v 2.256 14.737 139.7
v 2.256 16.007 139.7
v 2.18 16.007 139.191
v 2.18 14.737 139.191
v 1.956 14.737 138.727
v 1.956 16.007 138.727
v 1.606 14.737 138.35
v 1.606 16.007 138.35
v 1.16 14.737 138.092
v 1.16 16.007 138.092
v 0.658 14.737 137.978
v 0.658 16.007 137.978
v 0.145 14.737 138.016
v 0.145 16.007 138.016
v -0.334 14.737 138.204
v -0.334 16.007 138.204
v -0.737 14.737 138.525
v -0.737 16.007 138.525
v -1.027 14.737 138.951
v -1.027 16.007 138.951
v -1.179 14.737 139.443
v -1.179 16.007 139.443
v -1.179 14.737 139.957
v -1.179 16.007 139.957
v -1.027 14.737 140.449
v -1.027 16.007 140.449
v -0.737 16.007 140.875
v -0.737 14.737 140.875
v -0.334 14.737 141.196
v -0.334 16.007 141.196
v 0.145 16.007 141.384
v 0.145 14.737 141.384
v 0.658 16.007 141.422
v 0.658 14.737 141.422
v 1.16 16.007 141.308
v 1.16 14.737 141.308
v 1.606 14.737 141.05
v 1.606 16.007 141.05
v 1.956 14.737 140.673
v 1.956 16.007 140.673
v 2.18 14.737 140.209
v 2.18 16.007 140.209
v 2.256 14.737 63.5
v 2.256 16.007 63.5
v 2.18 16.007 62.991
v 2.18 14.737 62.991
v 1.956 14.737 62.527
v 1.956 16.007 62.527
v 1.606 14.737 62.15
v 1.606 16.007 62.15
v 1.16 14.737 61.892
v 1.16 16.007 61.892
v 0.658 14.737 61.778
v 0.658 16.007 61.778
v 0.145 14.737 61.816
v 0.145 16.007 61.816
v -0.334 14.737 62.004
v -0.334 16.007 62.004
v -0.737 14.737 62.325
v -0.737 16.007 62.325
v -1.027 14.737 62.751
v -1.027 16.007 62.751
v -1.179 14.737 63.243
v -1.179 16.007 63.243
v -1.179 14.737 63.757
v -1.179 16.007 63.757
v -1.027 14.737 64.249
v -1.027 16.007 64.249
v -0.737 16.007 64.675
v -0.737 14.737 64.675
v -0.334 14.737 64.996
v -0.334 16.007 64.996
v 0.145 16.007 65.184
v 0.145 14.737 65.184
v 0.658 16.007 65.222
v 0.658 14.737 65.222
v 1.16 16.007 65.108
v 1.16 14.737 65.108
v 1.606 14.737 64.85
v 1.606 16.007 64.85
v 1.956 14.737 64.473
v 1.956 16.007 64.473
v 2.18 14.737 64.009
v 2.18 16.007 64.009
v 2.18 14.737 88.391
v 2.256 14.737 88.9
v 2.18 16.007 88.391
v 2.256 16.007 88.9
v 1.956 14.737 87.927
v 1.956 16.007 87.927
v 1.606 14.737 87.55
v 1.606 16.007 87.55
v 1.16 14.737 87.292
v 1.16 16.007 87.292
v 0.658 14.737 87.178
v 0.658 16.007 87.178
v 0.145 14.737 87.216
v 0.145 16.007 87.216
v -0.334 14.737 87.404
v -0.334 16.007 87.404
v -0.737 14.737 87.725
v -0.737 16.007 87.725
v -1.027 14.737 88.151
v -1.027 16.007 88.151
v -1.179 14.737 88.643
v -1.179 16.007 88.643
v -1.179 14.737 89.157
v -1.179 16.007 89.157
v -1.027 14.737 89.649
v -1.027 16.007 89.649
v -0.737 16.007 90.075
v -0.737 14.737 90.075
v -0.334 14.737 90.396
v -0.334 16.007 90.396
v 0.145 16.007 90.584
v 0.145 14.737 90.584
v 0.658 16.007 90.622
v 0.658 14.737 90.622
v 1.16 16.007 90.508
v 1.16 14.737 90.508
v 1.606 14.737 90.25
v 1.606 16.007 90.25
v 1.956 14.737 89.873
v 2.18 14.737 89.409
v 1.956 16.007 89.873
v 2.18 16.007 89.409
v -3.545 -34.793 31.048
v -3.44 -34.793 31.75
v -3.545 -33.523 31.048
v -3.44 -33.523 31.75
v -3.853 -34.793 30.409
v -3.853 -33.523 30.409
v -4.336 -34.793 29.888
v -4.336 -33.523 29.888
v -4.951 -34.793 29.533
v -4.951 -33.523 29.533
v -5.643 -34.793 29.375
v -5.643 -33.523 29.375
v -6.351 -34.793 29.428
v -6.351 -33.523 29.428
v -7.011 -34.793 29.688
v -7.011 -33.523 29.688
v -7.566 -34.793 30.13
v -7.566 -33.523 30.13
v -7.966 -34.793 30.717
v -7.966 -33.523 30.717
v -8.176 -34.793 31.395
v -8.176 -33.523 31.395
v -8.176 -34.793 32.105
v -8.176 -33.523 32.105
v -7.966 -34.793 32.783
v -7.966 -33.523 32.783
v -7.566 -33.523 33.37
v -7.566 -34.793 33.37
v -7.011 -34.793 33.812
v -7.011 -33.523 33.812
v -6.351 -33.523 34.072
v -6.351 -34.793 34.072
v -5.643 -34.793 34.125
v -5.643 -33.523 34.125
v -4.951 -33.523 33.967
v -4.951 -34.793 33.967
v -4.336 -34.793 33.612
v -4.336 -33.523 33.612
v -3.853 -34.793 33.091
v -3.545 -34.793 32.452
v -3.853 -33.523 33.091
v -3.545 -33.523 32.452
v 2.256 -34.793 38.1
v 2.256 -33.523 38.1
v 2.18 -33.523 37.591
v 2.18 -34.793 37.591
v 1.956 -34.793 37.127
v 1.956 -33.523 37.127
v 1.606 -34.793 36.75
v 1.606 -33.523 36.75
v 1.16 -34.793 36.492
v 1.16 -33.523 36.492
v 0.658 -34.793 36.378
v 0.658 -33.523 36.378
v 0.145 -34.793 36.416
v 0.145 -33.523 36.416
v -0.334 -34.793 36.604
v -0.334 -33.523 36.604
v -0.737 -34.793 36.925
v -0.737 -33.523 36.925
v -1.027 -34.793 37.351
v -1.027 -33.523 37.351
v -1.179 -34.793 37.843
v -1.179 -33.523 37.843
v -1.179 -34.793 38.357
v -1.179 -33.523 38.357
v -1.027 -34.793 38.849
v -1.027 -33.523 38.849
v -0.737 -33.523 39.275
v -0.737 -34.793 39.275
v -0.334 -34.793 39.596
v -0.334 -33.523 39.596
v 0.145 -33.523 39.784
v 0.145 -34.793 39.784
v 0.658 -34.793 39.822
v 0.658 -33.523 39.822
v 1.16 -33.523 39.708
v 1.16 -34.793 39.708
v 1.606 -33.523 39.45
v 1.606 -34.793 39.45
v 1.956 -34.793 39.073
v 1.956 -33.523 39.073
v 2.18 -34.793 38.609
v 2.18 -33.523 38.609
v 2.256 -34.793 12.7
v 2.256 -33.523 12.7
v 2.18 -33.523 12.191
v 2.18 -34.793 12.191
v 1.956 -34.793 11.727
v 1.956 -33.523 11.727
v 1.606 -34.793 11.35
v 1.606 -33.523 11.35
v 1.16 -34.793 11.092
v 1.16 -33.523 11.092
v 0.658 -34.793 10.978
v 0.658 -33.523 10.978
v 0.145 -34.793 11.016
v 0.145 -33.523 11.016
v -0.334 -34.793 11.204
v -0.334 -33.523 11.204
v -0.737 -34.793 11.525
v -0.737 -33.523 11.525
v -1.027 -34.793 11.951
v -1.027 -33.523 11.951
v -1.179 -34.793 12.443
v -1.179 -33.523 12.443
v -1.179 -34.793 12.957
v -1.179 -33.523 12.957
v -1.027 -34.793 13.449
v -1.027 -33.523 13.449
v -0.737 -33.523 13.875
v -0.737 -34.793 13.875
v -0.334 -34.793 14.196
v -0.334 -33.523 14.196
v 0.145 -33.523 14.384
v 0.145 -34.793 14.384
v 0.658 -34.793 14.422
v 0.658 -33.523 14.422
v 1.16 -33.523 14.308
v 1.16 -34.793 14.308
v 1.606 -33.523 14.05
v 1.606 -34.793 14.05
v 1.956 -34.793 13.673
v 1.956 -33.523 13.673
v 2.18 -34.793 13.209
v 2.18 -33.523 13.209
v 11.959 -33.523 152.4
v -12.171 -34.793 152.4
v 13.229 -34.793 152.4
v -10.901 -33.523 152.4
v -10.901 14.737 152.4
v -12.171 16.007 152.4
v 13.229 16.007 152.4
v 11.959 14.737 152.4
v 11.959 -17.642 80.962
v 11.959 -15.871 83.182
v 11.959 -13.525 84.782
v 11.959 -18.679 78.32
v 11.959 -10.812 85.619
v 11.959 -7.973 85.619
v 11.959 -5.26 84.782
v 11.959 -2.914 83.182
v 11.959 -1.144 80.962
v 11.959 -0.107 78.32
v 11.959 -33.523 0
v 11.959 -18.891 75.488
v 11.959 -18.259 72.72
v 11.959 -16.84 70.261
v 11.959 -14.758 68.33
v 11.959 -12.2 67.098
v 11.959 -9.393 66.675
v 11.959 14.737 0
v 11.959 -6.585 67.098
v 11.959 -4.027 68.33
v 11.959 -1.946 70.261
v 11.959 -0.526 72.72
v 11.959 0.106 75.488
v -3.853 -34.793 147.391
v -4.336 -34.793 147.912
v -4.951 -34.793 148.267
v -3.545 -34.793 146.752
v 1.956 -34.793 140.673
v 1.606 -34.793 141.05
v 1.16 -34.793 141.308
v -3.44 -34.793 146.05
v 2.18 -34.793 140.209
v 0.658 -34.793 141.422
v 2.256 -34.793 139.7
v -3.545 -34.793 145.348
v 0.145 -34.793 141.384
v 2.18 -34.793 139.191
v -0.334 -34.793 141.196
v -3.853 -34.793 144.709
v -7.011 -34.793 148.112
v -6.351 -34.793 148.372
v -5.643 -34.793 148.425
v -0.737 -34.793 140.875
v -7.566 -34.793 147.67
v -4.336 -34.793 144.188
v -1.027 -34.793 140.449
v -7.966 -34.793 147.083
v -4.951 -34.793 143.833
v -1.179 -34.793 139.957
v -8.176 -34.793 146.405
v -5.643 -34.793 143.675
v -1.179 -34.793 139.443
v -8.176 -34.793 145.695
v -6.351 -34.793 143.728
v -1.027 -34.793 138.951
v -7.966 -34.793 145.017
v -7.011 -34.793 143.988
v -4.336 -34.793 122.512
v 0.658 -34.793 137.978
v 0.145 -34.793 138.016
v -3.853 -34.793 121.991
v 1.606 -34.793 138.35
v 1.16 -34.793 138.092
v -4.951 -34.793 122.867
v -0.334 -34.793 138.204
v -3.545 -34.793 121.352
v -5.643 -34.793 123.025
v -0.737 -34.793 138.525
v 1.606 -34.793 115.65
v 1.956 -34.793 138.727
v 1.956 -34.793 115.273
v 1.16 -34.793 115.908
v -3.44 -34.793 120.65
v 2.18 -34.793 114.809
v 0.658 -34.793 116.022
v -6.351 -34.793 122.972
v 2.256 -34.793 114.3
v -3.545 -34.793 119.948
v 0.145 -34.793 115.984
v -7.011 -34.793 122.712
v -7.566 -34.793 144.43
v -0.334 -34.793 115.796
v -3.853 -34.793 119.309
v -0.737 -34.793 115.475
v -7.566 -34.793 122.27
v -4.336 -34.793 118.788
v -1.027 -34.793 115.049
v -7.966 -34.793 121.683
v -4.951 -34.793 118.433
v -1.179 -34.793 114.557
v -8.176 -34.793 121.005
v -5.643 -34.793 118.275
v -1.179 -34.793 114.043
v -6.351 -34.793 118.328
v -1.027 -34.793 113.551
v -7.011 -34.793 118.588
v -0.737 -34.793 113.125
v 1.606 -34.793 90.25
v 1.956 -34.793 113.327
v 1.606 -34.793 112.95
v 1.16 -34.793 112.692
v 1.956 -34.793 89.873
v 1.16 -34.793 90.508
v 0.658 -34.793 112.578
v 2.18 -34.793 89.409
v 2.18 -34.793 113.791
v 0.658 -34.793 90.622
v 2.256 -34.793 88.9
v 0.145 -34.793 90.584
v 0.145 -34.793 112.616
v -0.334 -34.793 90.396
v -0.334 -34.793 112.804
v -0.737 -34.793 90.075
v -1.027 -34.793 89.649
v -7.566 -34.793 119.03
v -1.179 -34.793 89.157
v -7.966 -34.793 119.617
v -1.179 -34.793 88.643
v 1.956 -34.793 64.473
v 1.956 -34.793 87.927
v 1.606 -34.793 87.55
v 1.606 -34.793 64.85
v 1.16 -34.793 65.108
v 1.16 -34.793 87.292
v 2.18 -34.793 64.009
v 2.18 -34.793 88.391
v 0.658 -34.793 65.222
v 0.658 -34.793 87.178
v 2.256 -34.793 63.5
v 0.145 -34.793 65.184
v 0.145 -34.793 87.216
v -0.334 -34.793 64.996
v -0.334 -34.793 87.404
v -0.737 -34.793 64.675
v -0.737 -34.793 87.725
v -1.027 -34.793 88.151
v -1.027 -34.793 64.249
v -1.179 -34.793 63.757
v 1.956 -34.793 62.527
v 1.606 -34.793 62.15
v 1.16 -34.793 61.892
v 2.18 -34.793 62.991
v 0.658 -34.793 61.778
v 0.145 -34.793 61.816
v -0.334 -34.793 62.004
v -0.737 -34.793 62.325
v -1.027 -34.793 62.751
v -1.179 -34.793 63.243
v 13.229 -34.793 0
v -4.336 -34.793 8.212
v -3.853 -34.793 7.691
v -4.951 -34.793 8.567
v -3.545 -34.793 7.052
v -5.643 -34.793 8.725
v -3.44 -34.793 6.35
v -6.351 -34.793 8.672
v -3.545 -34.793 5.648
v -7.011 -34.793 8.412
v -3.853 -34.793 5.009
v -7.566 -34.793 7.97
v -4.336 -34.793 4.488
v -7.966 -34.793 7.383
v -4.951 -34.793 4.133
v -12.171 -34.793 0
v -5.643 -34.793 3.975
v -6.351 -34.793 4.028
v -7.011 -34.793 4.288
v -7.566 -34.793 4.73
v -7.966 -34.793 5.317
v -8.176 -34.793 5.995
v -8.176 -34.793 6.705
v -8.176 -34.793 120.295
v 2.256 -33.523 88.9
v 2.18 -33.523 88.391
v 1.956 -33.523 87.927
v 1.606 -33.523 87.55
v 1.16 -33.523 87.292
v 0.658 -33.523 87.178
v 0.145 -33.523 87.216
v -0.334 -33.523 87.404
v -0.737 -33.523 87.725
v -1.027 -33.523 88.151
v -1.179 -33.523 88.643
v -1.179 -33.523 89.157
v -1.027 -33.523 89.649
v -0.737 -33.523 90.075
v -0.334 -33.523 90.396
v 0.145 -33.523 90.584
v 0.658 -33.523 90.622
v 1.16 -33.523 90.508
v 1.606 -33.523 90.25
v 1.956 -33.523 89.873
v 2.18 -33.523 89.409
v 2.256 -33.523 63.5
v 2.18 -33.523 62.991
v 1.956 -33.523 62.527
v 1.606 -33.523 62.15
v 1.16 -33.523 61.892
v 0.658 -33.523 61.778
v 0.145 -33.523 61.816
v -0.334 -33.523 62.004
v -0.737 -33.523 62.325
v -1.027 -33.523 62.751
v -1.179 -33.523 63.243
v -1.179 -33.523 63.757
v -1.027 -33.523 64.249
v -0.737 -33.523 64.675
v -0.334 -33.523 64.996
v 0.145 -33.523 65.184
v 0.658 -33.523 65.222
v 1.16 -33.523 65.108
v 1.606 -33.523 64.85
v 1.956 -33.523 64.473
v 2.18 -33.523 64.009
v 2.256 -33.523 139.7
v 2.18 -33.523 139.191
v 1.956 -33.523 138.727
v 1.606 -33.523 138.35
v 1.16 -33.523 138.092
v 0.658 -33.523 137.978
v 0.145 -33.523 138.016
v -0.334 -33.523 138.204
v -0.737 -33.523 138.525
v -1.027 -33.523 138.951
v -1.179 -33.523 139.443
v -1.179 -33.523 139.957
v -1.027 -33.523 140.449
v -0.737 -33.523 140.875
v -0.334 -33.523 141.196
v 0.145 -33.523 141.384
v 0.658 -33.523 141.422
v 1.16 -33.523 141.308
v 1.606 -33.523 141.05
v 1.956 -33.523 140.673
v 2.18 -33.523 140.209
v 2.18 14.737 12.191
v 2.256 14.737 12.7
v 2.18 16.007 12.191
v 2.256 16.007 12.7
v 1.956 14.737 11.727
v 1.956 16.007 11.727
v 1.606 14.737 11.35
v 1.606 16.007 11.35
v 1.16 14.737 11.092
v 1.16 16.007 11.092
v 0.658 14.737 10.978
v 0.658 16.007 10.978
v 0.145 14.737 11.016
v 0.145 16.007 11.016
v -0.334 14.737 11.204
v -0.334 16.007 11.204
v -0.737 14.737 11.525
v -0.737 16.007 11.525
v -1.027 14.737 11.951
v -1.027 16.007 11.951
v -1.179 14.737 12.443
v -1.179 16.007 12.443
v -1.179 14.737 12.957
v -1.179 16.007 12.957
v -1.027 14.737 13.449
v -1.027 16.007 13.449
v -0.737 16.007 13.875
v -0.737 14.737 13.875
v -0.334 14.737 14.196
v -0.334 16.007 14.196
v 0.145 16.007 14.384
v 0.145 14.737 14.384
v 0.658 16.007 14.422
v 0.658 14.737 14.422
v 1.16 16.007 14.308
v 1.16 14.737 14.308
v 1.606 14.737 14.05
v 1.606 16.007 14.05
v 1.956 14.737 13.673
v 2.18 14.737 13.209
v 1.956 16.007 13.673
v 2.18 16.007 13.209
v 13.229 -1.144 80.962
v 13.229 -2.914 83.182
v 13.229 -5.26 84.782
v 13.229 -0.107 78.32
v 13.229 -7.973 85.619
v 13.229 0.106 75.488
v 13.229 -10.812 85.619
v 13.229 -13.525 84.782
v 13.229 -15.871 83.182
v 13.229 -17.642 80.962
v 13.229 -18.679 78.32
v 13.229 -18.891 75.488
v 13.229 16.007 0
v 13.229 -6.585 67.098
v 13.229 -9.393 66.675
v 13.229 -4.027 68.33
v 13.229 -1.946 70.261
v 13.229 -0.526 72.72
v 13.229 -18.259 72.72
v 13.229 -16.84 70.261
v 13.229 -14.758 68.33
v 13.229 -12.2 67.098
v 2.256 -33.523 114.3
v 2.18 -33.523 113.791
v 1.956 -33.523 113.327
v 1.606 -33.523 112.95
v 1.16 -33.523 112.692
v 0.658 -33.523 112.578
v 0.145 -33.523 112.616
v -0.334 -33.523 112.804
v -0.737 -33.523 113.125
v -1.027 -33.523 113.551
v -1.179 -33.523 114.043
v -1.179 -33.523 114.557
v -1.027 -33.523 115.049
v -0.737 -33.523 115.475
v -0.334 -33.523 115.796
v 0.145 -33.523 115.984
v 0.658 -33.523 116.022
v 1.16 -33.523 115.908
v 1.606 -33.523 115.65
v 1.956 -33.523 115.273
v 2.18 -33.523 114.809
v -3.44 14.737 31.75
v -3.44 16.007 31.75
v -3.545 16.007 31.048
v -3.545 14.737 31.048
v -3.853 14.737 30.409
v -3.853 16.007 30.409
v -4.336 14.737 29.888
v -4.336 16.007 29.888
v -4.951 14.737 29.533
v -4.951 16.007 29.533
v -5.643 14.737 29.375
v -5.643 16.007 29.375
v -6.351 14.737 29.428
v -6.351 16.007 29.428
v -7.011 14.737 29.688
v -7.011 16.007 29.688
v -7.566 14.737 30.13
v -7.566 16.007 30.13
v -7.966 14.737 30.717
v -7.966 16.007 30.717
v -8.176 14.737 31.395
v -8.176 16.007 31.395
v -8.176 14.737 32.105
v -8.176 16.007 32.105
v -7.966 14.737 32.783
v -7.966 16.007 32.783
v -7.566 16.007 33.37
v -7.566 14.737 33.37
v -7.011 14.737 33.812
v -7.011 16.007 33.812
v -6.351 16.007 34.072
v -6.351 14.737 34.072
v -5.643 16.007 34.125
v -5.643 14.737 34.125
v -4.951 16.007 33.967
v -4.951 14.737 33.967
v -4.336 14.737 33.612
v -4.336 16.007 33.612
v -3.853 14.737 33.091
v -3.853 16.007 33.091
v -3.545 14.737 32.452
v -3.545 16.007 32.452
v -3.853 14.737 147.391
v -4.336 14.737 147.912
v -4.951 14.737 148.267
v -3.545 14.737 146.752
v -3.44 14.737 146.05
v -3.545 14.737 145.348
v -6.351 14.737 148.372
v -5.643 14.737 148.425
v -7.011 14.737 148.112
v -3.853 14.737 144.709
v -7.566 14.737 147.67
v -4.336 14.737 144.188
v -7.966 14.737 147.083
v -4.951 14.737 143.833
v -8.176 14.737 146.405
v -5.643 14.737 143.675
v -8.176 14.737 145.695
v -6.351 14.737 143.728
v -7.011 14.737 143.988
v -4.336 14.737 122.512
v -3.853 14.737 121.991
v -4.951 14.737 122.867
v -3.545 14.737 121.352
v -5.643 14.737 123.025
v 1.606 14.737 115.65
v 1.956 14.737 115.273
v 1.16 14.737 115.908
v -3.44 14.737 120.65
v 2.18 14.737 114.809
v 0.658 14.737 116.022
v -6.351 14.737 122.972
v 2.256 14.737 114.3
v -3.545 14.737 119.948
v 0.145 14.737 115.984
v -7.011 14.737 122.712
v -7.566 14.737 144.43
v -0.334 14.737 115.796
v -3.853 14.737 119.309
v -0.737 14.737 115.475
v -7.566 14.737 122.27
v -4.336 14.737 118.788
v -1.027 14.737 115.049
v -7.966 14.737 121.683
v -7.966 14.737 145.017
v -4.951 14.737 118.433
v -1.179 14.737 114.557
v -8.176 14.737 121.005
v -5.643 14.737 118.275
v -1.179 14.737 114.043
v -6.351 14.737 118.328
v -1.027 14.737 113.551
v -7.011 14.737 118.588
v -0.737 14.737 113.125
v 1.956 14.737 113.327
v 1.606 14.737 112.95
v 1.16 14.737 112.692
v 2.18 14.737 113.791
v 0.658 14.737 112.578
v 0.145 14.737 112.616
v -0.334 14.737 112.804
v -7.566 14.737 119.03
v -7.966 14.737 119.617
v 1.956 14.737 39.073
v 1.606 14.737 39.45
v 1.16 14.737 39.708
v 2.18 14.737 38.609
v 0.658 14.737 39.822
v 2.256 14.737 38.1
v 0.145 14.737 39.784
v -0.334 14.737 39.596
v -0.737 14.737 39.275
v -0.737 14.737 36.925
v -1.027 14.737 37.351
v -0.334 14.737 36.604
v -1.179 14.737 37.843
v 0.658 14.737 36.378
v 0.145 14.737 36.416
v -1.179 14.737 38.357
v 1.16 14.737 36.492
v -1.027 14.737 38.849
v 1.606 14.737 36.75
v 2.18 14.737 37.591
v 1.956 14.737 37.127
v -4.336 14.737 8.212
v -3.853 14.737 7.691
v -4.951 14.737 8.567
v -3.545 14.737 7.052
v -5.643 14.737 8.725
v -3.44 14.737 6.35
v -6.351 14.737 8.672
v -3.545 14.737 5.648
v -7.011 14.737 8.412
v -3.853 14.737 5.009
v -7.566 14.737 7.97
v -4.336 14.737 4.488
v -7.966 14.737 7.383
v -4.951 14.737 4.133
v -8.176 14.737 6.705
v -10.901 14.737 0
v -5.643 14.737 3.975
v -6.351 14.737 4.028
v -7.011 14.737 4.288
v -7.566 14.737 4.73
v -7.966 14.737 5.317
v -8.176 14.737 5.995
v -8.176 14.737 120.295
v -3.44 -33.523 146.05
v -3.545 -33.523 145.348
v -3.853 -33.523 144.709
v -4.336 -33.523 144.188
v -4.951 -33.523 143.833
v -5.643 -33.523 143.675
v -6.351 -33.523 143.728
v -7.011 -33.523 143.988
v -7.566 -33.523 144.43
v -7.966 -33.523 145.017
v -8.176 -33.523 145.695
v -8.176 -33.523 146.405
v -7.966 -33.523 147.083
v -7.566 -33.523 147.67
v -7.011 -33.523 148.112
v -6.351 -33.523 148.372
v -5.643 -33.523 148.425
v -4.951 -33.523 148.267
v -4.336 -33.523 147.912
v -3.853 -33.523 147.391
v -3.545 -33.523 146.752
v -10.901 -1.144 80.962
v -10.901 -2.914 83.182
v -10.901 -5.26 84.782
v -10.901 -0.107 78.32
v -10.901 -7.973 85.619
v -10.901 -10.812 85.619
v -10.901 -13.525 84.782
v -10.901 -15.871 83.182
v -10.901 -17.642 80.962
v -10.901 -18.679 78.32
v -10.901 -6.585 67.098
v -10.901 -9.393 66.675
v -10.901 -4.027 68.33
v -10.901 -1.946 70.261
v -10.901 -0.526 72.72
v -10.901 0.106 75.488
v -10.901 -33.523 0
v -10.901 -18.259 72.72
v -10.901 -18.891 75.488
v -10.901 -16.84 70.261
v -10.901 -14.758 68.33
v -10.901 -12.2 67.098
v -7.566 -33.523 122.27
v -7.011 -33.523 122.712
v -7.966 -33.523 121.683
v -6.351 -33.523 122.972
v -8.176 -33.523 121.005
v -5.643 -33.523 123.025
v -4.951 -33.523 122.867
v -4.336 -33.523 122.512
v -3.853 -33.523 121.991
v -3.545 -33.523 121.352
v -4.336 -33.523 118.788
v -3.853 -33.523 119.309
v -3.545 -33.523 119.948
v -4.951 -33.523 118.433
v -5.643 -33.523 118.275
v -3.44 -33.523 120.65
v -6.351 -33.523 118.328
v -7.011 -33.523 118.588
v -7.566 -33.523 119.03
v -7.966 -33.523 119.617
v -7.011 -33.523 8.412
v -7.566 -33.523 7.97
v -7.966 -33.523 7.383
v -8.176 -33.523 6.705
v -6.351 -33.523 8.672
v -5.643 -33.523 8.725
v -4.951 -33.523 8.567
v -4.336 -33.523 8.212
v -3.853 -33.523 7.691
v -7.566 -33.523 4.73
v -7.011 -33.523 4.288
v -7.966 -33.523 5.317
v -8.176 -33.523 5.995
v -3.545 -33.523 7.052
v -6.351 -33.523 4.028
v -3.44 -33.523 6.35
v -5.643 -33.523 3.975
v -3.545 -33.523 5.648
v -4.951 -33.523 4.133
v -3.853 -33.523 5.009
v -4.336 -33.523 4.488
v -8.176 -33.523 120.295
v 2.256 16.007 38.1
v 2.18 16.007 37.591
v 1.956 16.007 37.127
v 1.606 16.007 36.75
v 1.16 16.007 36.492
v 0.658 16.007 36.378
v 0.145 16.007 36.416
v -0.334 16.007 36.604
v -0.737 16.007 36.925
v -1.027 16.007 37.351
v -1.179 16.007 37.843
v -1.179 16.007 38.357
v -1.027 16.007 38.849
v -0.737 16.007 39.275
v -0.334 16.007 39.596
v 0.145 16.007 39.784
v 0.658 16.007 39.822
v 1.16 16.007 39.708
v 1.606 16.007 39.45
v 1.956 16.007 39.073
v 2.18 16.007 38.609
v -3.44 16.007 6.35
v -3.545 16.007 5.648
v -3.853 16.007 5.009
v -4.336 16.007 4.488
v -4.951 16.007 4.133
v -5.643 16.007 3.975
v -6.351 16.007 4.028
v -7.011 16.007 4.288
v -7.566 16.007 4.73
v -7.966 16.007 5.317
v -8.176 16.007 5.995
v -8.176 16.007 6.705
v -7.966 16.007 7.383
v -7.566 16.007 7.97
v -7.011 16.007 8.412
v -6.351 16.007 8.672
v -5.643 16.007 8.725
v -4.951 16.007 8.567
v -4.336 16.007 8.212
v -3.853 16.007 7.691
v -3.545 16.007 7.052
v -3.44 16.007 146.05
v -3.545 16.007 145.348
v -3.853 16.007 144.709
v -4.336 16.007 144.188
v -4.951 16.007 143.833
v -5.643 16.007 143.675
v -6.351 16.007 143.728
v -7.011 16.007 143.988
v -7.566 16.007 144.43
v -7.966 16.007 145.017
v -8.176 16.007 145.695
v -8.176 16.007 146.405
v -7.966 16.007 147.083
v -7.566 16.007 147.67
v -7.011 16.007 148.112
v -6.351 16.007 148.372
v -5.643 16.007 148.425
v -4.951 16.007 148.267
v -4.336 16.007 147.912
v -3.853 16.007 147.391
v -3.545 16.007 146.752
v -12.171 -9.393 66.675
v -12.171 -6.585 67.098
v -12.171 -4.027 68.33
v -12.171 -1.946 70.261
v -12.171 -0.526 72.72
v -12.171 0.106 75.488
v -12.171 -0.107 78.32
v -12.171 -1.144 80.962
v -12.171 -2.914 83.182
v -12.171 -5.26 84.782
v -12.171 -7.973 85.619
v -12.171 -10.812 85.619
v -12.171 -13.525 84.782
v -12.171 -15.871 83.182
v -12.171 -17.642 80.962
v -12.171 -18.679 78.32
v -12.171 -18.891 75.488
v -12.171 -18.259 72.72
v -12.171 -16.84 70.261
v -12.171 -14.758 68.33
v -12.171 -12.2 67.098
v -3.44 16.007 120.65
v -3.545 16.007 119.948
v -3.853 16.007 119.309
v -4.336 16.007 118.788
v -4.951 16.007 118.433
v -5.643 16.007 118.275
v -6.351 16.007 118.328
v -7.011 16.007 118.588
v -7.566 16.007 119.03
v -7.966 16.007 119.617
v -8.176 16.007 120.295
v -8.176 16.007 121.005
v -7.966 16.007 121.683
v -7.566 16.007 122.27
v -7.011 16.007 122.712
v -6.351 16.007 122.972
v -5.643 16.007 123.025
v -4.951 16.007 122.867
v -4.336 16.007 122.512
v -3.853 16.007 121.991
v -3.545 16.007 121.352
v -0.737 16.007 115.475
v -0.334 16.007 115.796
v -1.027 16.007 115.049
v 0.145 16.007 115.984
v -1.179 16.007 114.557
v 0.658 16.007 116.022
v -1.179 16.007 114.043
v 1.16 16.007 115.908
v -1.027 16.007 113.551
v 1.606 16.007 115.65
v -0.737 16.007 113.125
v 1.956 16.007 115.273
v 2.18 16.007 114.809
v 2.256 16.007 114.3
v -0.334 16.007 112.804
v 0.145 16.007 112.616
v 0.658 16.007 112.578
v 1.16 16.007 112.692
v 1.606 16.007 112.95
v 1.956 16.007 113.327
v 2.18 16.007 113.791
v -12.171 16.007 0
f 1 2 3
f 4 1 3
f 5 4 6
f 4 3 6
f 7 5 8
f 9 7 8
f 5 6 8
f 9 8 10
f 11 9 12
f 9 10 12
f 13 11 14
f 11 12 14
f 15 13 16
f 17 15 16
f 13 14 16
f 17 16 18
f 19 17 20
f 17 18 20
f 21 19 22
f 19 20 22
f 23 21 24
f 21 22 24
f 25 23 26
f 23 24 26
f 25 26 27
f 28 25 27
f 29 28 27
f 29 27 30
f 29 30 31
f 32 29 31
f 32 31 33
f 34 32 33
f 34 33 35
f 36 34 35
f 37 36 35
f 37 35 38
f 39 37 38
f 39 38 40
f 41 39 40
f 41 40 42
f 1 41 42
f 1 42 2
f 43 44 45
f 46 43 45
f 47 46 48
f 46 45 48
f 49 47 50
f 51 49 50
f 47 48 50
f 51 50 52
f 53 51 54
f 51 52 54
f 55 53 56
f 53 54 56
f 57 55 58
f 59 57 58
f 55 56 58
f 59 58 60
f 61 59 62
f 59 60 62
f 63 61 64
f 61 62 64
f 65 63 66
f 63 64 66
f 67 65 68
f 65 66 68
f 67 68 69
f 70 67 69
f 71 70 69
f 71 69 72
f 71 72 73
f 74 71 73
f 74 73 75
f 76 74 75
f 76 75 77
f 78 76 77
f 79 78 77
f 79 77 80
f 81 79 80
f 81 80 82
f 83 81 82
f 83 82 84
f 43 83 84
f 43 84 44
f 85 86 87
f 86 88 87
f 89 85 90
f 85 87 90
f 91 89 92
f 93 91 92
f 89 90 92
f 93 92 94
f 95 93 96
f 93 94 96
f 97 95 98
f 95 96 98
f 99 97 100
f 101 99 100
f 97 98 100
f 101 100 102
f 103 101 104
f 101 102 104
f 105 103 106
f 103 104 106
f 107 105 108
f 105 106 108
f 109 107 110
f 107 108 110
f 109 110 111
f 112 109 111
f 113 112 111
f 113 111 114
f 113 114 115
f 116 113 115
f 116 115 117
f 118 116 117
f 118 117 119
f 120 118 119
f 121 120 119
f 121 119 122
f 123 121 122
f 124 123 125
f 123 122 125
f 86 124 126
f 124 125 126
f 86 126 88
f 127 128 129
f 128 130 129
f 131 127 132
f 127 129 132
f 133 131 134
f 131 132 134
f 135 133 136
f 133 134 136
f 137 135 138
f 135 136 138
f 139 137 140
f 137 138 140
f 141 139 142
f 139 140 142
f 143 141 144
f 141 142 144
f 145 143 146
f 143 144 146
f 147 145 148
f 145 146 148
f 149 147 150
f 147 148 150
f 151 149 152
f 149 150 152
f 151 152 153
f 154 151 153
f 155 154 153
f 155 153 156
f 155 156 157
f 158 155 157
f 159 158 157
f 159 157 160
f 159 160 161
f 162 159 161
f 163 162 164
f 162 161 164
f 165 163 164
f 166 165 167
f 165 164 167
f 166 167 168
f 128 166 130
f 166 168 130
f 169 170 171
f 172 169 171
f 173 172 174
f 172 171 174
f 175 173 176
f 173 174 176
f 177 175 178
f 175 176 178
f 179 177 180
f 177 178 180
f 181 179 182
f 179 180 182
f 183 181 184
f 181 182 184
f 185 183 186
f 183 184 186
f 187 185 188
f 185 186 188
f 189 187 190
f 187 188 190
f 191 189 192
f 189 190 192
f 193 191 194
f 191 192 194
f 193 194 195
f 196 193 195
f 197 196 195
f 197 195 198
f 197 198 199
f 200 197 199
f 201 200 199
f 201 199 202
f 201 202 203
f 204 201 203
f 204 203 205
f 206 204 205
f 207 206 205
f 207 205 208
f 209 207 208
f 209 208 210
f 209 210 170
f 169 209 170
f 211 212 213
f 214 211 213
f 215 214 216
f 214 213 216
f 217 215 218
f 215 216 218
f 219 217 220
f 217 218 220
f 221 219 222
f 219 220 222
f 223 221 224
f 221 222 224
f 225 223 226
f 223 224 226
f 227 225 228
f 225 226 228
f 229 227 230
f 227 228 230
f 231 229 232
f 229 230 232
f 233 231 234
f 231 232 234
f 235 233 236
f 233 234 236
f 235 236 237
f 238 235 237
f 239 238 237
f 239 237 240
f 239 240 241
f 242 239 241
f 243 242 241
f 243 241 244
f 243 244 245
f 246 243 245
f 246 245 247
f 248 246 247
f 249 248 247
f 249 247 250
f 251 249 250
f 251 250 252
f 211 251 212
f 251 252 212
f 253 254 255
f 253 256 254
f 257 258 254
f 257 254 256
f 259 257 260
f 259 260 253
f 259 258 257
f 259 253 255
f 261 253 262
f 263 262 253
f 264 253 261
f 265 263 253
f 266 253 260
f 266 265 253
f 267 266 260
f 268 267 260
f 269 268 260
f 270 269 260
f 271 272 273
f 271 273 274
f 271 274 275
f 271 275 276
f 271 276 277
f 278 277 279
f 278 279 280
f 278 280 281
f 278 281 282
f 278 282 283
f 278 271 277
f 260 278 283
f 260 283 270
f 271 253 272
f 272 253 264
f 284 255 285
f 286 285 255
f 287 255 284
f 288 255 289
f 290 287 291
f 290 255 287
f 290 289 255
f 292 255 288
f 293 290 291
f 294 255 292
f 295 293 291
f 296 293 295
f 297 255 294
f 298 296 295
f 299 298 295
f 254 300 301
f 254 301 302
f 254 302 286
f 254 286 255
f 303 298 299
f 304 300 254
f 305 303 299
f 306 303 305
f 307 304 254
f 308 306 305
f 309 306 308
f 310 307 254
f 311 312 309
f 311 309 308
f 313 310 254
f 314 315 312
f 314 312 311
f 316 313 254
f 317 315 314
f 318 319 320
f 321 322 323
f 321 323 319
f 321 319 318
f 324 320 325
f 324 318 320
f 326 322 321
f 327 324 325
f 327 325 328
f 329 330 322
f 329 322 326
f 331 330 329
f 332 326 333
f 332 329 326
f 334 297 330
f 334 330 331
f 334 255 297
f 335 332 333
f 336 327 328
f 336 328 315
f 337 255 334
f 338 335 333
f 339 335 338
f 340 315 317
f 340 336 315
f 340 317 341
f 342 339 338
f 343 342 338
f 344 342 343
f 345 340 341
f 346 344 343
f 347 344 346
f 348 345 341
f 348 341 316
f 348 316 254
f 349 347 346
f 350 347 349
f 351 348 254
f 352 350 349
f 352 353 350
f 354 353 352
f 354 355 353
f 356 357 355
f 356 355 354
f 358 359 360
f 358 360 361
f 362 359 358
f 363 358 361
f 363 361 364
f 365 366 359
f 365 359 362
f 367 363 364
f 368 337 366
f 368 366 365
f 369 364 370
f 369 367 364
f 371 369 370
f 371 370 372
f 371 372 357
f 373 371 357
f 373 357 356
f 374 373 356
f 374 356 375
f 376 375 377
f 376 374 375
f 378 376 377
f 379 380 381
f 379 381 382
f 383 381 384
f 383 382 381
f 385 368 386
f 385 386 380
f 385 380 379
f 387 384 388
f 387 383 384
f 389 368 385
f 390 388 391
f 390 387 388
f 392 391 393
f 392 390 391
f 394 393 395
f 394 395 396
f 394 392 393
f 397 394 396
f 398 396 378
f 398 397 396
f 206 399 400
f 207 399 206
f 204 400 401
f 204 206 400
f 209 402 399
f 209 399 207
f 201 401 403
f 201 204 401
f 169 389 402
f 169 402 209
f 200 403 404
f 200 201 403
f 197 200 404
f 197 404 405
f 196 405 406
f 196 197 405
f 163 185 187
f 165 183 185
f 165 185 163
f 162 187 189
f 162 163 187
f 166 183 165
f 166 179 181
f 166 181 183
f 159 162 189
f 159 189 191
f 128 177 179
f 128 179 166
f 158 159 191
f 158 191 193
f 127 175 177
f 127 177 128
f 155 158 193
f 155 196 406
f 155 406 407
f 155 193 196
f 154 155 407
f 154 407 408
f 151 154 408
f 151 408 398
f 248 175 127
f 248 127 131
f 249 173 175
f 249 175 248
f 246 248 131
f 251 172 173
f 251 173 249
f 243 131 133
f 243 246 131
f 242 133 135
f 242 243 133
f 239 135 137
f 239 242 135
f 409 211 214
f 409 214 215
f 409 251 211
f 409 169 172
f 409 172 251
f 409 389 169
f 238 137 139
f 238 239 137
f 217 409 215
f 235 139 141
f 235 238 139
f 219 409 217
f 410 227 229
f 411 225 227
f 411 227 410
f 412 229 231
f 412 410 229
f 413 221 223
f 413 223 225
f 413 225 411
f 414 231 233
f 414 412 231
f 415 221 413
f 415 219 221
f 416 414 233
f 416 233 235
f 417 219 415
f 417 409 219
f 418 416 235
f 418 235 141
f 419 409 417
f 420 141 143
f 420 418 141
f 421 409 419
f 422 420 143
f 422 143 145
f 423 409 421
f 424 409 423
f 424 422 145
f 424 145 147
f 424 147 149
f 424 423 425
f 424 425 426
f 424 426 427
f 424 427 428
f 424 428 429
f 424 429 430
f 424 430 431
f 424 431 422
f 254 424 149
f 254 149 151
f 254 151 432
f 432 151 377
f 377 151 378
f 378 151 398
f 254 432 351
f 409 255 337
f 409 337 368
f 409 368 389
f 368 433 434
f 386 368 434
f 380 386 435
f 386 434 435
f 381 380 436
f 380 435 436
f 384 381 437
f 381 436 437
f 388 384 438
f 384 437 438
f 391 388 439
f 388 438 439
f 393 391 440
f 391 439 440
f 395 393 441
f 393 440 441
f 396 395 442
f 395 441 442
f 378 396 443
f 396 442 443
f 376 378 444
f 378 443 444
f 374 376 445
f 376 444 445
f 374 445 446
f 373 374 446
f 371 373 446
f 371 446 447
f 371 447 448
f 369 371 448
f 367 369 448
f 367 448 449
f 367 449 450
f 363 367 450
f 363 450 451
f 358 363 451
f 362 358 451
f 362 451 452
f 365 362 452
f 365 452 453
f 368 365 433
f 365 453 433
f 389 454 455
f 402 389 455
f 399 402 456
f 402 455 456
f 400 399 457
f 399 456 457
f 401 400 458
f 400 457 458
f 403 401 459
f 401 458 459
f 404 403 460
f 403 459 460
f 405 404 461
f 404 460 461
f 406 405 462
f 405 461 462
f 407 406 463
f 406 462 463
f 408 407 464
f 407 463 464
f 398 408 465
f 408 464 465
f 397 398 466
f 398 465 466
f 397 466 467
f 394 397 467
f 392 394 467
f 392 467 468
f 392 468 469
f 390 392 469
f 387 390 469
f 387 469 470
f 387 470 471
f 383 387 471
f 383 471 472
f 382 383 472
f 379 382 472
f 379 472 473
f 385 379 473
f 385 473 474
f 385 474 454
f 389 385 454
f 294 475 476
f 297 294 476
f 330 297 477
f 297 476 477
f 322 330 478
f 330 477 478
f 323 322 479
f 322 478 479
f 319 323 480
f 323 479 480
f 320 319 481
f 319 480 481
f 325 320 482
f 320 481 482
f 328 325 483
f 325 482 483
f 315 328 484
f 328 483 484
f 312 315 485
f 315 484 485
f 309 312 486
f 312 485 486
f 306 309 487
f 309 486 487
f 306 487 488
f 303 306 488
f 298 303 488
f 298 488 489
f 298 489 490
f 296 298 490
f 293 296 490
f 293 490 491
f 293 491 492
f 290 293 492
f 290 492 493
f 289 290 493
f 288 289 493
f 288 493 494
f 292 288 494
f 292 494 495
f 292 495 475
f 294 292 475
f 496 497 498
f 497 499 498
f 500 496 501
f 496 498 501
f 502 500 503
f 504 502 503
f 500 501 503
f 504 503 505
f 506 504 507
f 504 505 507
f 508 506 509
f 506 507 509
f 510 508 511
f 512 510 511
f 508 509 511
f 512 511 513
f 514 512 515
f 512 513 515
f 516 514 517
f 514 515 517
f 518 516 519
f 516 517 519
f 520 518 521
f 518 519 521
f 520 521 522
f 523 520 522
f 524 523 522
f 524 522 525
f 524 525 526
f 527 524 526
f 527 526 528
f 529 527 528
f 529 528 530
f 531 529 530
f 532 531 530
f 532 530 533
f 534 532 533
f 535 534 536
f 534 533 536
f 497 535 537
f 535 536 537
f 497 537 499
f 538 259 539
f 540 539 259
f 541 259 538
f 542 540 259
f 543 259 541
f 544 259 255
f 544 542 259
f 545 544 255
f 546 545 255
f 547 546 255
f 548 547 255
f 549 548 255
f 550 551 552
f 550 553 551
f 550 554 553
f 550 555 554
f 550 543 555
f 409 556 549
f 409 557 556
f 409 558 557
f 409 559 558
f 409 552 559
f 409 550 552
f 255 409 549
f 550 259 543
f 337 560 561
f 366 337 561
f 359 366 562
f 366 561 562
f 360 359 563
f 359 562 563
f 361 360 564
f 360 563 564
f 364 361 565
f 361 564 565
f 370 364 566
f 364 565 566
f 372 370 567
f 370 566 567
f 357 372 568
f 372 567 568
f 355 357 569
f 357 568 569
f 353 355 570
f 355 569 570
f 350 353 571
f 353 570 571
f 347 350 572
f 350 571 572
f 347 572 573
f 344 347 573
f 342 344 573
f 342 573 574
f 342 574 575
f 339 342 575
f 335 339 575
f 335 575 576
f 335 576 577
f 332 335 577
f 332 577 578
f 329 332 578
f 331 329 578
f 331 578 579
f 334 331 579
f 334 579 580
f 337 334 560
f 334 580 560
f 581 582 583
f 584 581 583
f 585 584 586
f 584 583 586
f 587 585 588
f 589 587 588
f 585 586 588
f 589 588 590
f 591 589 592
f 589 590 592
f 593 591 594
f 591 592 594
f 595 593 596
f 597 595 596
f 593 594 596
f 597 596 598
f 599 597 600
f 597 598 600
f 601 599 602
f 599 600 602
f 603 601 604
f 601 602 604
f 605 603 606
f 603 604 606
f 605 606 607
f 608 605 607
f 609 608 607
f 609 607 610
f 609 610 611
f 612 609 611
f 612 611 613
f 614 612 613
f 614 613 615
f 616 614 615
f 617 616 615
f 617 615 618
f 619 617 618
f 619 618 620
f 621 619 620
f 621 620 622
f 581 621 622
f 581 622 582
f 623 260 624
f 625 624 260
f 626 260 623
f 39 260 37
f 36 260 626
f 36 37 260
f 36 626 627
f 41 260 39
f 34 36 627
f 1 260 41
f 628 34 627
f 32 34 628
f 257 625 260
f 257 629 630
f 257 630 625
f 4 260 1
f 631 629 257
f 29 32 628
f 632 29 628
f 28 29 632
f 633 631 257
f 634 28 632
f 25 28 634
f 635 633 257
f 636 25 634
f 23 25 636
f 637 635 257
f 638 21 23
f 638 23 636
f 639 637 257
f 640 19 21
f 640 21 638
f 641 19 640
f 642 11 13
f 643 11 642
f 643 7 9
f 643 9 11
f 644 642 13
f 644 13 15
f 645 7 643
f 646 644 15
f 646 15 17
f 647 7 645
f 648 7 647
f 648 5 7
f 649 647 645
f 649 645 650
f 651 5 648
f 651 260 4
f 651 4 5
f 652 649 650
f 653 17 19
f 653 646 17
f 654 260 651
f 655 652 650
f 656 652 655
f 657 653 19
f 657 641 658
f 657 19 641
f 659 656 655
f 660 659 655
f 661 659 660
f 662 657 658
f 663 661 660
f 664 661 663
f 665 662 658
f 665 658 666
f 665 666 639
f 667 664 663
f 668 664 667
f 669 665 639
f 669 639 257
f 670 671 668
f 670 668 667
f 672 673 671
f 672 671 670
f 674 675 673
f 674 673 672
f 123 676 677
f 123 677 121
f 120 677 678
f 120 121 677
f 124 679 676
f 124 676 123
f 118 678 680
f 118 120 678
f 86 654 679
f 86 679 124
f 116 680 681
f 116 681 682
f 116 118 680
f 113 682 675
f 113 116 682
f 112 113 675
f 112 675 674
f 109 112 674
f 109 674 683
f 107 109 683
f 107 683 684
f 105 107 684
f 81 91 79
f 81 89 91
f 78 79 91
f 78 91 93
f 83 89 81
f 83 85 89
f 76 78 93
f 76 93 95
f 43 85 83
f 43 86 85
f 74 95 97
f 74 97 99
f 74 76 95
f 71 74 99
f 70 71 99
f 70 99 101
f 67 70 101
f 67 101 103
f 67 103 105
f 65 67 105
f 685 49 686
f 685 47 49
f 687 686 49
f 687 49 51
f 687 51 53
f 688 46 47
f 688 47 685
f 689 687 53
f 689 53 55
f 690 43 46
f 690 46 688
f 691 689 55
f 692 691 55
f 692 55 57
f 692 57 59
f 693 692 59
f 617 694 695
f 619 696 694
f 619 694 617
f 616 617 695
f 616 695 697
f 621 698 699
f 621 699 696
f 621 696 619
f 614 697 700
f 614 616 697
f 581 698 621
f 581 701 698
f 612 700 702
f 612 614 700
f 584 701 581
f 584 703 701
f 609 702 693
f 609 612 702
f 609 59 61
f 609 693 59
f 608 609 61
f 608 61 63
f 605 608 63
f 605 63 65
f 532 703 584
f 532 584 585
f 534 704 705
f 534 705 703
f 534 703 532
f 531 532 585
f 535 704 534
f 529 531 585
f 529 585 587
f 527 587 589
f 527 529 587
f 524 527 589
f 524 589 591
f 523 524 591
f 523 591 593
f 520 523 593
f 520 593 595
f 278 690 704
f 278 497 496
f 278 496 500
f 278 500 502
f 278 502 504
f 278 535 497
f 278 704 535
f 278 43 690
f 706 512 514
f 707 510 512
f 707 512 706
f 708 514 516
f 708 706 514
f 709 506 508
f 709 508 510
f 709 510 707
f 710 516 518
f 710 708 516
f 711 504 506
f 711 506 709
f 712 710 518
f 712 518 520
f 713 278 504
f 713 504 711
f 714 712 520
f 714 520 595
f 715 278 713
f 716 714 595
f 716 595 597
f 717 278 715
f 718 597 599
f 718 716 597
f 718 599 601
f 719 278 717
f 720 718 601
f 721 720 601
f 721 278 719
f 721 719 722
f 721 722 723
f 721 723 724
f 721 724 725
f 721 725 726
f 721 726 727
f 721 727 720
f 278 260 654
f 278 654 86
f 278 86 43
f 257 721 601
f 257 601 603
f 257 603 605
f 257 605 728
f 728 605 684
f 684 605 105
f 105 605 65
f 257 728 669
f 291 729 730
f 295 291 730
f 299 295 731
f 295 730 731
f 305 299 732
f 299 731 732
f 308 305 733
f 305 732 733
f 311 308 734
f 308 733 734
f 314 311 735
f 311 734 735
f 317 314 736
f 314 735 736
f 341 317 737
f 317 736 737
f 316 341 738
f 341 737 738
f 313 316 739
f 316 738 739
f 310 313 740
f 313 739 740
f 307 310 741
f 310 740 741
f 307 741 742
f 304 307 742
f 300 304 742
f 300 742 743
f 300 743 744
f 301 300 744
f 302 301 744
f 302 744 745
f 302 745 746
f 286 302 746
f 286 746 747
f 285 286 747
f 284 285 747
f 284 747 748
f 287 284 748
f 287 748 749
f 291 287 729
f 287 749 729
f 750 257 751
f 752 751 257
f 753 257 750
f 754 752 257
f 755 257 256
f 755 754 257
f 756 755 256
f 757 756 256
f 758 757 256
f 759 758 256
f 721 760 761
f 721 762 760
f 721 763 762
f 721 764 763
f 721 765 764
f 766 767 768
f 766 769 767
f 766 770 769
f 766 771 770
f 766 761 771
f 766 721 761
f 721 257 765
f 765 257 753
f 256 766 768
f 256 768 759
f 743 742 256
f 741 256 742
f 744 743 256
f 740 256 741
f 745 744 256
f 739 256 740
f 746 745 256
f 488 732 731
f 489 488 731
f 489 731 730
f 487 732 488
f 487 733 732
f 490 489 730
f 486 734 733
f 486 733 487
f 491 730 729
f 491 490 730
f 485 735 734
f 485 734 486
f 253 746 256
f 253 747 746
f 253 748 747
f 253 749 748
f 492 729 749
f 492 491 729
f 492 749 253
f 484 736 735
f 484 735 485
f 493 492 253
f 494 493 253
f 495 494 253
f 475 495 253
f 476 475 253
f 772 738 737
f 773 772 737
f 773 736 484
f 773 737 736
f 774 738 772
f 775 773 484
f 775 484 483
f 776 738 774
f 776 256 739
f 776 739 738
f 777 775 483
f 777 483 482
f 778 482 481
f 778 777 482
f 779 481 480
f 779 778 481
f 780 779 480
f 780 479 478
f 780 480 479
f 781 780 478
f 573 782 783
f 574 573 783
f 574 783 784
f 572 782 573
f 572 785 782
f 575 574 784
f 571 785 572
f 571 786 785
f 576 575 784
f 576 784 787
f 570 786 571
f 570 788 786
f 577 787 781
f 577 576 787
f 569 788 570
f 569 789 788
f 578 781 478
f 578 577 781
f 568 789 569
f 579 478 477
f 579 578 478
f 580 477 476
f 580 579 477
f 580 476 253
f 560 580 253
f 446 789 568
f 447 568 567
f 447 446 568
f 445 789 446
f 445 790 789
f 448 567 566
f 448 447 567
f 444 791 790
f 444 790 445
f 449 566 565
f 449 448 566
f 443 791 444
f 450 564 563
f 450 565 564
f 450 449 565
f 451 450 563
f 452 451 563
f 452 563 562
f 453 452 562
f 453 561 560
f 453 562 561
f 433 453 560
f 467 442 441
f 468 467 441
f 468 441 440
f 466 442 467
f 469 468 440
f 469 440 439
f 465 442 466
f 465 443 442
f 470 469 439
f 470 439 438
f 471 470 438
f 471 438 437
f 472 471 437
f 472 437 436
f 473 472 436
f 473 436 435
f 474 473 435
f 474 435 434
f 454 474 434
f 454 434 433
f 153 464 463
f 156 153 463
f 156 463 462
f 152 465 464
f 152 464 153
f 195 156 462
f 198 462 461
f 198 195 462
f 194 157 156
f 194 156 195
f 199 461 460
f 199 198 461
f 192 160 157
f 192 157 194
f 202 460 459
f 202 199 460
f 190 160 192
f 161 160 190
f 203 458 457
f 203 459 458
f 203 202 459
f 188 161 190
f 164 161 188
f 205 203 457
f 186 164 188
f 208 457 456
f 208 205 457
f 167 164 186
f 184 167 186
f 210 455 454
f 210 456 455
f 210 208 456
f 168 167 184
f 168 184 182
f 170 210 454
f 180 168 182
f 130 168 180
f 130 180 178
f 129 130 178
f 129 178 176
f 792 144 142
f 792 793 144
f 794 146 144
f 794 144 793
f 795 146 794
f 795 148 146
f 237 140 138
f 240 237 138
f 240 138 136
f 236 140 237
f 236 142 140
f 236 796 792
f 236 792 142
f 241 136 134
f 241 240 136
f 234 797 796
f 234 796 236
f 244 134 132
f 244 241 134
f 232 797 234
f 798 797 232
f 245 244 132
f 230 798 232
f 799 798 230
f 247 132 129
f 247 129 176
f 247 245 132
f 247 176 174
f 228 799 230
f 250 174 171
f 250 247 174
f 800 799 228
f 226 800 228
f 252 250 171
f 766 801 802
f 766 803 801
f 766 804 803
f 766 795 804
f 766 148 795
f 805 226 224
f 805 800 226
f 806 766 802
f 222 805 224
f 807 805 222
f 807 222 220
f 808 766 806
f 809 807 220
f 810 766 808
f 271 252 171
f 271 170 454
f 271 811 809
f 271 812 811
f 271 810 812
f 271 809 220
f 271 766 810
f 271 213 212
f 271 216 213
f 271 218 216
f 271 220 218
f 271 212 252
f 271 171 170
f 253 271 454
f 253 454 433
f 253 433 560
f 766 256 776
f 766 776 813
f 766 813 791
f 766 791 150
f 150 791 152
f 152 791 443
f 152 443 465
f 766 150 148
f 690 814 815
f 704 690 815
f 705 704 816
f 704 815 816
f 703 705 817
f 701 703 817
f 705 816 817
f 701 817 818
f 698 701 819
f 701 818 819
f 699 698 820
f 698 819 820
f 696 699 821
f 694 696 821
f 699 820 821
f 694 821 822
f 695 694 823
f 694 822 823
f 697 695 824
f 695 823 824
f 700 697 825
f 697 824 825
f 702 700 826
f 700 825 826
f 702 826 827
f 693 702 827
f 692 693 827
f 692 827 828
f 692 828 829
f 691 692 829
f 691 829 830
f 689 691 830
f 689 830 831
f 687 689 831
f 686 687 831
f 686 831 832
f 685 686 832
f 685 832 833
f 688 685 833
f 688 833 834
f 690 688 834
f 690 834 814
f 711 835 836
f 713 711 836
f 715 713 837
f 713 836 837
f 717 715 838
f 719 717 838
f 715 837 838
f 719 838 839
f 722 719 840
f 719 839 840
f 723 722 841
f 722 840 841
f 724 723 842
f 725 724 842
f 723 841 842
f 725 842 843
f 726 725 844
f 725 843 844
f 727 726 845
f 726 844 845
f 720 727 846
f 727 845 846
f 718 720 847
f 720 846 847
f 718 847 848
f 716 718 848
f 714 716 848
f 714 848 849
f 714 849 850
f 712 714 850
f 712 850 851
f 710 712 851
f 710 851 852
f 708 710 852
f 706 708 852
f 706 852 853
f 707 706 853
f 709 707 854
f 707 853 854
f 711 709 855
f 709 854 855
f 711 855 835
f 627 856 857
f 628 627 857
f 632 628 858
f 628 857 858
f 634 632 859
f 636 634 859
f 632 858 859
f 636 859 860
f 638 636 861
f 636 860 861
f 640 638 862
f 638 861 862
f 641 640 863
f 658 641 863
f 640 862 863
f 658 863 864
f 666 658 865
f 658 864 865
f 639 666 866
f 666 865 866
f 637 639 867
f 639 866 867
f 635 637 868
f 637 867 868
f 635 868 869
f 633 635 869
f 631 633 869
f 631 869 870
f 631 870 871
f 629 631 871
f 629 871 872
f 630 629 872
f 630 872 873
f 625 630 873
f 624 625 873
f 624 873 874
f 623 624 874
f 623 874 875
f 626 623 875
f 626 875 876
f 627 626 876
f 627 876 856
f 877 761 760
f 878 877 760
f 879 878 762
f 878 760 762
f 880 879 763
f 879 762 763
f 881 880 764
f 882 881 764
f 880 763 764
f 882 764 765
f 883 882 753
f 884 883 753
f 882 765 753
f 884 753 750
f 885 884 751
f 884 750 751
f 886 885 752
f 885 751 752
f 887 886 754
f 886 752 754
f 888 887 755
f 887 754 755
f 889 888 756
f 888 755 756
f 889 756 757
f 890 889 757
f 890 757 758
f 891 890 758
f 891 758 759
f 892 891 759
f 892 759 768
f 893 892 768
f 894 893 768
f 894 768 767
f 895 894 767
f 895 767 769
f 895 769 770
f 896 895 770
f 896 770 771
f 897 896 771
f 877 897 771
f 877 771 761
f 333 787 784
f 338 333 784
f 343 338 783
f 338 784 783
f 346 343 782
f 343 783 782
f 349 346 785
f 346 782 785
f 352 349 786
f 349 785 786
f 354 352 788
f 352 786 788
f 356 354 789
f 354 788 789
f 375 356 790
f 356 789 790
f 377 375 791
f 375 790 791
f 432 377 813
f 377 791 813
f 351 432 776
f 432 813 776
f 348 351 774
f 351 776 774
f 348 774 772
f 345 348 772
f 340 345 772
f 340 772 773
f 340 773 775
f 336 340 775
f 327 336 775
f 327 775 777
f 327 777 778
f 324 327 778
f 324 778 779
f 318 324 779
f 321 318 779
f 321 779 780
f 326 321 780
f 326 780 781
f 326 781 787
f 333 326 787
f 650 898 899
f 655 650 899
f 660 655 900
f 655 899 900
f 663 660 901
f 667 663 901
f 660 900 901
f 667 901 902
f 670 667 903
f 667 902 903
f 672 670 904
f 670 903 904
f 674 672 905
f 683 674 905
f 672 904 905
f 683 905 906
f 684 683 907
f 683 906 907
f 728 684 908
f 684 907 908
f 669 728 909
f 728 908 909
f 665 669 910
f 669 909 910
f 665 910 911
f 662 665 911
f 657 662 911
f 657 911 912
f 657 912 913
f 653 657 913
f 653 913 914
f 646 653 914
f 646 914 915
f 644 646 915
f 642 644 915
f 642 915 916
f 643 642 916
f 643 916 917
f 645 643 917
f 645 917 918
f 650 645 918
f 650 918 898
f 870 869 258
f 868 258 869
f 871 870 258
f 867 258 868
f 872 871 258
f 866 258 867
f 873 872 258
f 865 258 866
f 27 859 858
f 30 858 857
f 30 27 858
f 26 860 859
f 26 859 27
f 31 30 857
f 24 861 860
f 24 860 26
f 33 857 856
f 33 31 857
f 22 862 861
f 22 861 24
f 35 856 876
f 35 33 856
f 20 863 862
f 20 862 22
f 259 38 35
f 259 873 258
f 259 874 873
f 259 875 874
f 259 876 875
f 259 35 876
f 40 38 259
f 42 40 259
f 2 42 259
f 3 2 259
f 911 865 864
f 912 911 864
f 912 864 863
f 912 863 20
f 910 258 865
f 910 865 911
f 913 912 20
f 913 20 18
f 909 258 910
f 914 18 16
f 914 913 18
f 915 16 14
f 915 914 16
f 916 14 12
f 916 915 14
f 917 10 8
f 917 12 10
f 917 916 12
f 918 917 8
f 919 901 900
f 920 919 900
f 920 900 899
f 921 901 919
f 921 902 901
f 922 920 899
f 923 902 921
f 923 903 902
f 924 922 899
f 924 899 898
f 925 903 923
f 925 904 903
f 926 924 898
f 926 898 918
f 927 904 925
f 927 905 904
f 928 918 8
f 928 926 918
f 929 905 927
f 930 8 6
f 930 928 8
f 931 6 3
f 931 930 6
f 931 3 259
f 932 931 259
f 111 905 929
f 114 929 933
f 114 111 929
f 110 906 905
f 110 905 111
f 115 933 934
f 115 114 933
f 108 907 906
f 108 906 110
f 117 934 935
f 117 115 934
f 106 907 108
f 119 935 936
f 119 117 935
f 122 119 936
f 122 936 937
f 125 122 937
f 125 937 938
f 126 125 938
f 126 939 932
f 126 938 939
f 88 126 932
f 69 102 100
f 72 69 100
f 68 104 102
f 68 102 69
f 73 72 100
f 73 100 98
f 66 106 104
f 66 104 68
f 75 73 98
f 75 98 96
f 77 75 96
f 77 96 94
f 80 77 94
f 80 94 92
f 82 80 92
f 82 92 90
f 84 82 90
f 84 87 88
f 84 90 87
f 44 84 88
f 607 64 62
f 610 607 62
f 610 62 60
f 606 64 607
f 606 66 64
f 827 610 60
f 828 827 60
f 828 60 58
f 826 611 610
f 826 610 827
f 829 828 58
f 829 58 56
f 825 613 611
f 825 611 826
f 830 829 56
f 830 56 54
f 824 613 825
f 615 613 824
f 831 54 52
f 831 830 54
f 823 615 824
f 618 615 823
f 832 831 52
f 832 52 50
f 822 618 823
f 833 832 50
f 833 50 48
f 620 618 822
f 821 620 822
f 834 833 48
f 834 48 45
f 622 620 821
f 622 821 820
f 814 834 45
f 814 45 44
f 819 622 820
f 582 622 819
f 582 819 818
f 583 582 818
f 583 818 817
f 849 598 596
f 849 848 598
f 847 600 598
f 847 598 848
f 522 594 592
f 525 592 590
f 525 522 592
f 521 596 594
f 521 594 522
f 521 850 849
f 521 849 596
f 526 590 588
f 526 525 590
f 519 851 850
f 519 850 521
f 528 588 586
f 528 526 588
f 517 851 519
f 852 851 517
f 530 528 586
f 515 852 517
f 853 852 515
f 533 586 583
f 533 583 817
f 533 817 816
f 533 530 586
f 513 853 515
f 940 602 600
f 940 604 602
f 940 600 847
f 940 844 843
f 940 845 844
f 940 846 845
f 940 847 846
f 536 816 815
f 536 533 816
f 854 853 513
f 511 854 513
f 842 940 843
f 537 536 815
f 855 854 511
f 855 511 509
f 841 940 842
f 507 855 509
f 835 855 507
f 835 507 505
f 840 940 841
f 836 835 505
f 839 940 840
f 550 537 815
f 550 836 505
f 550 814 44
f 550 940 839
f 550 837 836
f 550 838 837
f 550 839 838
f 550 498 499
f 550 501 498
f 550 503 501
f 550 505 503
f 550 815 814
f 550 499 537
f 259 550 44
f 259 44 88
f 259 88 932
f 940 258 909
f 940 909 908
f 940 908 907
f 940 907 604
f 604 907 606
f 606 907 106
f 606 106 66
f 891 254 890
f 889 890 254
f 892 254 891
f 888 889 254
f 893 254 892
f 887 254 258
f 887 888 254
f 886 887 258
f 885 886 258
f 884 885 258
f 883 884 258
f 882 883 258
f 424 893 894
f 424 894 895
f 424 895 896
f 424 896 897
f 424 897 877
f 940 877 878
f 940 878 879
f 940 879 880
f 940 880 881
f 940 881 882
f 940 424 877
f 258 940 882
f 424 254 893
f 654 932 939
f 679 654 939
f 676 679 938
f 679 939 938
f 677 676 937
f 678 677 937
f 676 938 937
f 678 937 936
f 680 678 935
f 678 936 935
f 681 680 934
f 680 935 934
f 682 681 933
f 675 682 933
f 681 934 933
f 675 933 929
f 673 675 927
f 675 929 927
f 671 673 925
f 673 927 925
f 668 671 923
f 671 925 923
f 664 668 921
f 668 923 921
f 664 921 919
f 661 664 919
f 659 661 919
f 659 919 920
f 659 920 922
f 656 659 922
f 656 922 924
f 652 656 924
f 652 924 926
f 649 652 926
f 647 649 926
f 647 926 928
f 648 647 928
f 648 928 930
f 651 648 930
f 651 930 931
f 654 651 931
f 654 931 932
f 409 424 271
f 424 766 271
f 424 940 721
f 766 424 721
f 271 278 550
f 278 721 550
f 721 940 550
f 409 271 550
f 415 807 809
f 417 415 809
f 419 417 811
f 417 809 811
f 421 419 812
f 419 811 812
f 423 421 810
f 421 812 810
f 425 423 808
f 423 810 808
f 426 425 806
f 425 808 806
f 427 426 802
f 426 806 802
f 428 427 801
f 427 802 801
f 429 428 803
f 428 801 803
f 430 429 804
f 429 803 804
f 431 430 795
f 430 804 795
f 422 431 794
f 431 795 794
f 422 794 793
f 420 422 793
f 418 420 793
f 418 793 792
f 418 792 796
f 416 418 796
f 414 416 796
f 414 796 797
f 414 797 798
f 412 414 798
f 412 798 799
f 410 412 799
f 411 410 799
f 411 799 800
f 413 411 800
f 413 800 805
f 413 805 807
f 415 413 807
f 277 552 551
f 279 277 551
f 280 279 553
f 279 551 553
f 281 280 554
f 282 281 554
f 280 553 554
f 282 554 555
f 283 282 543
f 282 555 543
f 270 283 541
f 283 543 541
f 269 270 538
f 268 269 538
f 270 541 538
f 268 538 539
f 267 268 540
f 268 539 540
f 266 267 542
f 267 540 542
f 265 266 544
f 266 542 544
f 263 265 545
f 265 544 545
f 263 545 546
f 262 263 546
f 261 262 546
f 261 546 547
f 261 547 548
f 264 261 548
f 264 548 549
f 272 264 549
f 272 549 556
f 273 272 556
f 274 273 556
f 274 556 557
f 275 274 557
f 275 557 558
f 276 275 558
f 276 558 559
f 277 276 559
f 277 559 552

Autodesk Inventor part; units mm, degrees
ref_plane "YZ Plane" through (0, 0, 0) normal (1, 0, 0) x (0, 1, 0)
ref_plane "XZ Plane" through (0, 0, 0) normal (0, 1, 0) x (-1, 0, 0)
ref_plane "XY Plane" through (0, 0, 0) normal (0, 0, 1) x (1, 0, 0)
sketch "Sketch1" plane through (0, 0, 0) normal (0, 0, 1) x (1, 0, 0)
  line L0 (-12.1708, 16.0073) -> (13.2292, 16.0073)
  line L1 (13.2292, 16.0073) -> (13.2292, -34.7927)
  line L2 (13.2292, -34.7927) -> (-12.1708, -34.7927)
  line L3 (-12.1708, -34.7927) -> (-12.1708, 16.0073)
  line L4 (11.9592, 14.7373) -> (-10.9008, 14.7373)
  line L5 (-10.9008, 14.7373) -> (-10.9008, -33.5227)
  line L6 (-10.9008, -33.5227) -> (11.9592, -33.5227)
  line L7 (11.9592, -33.5227) -> (11.9592, 14.7373)
  point P0 (0, 0)
  dimension "d0" = 25.4
  dimension "d1" = 50.8
  dimension "d2" = 1.27
extrude "Extrusion1" add sketch "Sketch1" along normal blind 152.4
sketch "Sketch2" plane through (-12.1708, 16.0073, 0) normal (0, 1, 0) x (1, 0, 0)
  circle A0 centre (12.7, -12.7) radius 1.7272
  line L0 (25.4, 0) -> (0, 0) projected
  line L1 (0, 0) -> (0, -152.4) projected
  point P0 (12.1708, 0)
  dimension "d5" = 3.4544
  dimension "d6" = 12.7
  dimension "d7" = 12.7
extrude "Extrusion2" cut sketch "Sketch2" against normal through all
pattern_linear "Rectangular Pattern1" count 15 spacing 25.4 along (0, 0, 1) of "Extrusion2"
sketch "Sketch3" plane through (-12.1708, 16.0073, 0) normal (0, 1, 0) x (1, 0, 0)
  circle A0 centre (6.35, -6.35) radius 2.3813
  line L0 (25.4, 0) -> (0, 0) projected
  line L1 (0, 0) -> (0, -152.4) projected
  circle A1 centre (6.35, -146.05) radius 2.3813
  line L2 (25.4, -152.4) -> (0, -152.4) projected
  circle A2 centre (6.35, -120.65) radius 2.3813
  circle A3 centre (6.35, -31.75) radius 2.3813
  point P0 (12.1708, 0)
  dimension "d15" = 6.35
  dimension "d16" = 6.35
  dimension "d17" = 4.7625
  dimension "d18" = 6.35
  dimension "d19" = 6.35
  dimension "d20" = 4.7625
  dimension "d23" = 6.35
  dimension "d24" = 6.35
  dimension "d25" = 25.4
  dimension "d26" = 4.7625
  dimension "d27" = 25.4
  dimension "d28" = 4.7625
extrude "Extrusion3" cut sketch "Sketch3" against normal through all
sketch "Sketch4" plane through (13.2292, -34.7927, 0) normal (1, 0, 0) x (0, 0, -1)
  circle A0 centre (-76.2, 25.4) radius 9.525
  line L0 (0, 0) -> (-152.4, 0) projected
  line L1 (0, 0) -> (0, 50.8) projected
  point P0 (0, 34.7927)
  point P1 (0, 25.4)
  dimension "d29" = 25.4
  dimension "d30" = 76.2
  dimension "d31" = 19.05
extrude "Extrusion4" cut sketch "Sketch4" against normal through all
equation "\"d3\" = d13"
equation "\"d10\" = d14"
equation "\"d13\" = 152.4"
equation "\"d14\" = d13"
properties part number "VersaFrame (arm base)"
